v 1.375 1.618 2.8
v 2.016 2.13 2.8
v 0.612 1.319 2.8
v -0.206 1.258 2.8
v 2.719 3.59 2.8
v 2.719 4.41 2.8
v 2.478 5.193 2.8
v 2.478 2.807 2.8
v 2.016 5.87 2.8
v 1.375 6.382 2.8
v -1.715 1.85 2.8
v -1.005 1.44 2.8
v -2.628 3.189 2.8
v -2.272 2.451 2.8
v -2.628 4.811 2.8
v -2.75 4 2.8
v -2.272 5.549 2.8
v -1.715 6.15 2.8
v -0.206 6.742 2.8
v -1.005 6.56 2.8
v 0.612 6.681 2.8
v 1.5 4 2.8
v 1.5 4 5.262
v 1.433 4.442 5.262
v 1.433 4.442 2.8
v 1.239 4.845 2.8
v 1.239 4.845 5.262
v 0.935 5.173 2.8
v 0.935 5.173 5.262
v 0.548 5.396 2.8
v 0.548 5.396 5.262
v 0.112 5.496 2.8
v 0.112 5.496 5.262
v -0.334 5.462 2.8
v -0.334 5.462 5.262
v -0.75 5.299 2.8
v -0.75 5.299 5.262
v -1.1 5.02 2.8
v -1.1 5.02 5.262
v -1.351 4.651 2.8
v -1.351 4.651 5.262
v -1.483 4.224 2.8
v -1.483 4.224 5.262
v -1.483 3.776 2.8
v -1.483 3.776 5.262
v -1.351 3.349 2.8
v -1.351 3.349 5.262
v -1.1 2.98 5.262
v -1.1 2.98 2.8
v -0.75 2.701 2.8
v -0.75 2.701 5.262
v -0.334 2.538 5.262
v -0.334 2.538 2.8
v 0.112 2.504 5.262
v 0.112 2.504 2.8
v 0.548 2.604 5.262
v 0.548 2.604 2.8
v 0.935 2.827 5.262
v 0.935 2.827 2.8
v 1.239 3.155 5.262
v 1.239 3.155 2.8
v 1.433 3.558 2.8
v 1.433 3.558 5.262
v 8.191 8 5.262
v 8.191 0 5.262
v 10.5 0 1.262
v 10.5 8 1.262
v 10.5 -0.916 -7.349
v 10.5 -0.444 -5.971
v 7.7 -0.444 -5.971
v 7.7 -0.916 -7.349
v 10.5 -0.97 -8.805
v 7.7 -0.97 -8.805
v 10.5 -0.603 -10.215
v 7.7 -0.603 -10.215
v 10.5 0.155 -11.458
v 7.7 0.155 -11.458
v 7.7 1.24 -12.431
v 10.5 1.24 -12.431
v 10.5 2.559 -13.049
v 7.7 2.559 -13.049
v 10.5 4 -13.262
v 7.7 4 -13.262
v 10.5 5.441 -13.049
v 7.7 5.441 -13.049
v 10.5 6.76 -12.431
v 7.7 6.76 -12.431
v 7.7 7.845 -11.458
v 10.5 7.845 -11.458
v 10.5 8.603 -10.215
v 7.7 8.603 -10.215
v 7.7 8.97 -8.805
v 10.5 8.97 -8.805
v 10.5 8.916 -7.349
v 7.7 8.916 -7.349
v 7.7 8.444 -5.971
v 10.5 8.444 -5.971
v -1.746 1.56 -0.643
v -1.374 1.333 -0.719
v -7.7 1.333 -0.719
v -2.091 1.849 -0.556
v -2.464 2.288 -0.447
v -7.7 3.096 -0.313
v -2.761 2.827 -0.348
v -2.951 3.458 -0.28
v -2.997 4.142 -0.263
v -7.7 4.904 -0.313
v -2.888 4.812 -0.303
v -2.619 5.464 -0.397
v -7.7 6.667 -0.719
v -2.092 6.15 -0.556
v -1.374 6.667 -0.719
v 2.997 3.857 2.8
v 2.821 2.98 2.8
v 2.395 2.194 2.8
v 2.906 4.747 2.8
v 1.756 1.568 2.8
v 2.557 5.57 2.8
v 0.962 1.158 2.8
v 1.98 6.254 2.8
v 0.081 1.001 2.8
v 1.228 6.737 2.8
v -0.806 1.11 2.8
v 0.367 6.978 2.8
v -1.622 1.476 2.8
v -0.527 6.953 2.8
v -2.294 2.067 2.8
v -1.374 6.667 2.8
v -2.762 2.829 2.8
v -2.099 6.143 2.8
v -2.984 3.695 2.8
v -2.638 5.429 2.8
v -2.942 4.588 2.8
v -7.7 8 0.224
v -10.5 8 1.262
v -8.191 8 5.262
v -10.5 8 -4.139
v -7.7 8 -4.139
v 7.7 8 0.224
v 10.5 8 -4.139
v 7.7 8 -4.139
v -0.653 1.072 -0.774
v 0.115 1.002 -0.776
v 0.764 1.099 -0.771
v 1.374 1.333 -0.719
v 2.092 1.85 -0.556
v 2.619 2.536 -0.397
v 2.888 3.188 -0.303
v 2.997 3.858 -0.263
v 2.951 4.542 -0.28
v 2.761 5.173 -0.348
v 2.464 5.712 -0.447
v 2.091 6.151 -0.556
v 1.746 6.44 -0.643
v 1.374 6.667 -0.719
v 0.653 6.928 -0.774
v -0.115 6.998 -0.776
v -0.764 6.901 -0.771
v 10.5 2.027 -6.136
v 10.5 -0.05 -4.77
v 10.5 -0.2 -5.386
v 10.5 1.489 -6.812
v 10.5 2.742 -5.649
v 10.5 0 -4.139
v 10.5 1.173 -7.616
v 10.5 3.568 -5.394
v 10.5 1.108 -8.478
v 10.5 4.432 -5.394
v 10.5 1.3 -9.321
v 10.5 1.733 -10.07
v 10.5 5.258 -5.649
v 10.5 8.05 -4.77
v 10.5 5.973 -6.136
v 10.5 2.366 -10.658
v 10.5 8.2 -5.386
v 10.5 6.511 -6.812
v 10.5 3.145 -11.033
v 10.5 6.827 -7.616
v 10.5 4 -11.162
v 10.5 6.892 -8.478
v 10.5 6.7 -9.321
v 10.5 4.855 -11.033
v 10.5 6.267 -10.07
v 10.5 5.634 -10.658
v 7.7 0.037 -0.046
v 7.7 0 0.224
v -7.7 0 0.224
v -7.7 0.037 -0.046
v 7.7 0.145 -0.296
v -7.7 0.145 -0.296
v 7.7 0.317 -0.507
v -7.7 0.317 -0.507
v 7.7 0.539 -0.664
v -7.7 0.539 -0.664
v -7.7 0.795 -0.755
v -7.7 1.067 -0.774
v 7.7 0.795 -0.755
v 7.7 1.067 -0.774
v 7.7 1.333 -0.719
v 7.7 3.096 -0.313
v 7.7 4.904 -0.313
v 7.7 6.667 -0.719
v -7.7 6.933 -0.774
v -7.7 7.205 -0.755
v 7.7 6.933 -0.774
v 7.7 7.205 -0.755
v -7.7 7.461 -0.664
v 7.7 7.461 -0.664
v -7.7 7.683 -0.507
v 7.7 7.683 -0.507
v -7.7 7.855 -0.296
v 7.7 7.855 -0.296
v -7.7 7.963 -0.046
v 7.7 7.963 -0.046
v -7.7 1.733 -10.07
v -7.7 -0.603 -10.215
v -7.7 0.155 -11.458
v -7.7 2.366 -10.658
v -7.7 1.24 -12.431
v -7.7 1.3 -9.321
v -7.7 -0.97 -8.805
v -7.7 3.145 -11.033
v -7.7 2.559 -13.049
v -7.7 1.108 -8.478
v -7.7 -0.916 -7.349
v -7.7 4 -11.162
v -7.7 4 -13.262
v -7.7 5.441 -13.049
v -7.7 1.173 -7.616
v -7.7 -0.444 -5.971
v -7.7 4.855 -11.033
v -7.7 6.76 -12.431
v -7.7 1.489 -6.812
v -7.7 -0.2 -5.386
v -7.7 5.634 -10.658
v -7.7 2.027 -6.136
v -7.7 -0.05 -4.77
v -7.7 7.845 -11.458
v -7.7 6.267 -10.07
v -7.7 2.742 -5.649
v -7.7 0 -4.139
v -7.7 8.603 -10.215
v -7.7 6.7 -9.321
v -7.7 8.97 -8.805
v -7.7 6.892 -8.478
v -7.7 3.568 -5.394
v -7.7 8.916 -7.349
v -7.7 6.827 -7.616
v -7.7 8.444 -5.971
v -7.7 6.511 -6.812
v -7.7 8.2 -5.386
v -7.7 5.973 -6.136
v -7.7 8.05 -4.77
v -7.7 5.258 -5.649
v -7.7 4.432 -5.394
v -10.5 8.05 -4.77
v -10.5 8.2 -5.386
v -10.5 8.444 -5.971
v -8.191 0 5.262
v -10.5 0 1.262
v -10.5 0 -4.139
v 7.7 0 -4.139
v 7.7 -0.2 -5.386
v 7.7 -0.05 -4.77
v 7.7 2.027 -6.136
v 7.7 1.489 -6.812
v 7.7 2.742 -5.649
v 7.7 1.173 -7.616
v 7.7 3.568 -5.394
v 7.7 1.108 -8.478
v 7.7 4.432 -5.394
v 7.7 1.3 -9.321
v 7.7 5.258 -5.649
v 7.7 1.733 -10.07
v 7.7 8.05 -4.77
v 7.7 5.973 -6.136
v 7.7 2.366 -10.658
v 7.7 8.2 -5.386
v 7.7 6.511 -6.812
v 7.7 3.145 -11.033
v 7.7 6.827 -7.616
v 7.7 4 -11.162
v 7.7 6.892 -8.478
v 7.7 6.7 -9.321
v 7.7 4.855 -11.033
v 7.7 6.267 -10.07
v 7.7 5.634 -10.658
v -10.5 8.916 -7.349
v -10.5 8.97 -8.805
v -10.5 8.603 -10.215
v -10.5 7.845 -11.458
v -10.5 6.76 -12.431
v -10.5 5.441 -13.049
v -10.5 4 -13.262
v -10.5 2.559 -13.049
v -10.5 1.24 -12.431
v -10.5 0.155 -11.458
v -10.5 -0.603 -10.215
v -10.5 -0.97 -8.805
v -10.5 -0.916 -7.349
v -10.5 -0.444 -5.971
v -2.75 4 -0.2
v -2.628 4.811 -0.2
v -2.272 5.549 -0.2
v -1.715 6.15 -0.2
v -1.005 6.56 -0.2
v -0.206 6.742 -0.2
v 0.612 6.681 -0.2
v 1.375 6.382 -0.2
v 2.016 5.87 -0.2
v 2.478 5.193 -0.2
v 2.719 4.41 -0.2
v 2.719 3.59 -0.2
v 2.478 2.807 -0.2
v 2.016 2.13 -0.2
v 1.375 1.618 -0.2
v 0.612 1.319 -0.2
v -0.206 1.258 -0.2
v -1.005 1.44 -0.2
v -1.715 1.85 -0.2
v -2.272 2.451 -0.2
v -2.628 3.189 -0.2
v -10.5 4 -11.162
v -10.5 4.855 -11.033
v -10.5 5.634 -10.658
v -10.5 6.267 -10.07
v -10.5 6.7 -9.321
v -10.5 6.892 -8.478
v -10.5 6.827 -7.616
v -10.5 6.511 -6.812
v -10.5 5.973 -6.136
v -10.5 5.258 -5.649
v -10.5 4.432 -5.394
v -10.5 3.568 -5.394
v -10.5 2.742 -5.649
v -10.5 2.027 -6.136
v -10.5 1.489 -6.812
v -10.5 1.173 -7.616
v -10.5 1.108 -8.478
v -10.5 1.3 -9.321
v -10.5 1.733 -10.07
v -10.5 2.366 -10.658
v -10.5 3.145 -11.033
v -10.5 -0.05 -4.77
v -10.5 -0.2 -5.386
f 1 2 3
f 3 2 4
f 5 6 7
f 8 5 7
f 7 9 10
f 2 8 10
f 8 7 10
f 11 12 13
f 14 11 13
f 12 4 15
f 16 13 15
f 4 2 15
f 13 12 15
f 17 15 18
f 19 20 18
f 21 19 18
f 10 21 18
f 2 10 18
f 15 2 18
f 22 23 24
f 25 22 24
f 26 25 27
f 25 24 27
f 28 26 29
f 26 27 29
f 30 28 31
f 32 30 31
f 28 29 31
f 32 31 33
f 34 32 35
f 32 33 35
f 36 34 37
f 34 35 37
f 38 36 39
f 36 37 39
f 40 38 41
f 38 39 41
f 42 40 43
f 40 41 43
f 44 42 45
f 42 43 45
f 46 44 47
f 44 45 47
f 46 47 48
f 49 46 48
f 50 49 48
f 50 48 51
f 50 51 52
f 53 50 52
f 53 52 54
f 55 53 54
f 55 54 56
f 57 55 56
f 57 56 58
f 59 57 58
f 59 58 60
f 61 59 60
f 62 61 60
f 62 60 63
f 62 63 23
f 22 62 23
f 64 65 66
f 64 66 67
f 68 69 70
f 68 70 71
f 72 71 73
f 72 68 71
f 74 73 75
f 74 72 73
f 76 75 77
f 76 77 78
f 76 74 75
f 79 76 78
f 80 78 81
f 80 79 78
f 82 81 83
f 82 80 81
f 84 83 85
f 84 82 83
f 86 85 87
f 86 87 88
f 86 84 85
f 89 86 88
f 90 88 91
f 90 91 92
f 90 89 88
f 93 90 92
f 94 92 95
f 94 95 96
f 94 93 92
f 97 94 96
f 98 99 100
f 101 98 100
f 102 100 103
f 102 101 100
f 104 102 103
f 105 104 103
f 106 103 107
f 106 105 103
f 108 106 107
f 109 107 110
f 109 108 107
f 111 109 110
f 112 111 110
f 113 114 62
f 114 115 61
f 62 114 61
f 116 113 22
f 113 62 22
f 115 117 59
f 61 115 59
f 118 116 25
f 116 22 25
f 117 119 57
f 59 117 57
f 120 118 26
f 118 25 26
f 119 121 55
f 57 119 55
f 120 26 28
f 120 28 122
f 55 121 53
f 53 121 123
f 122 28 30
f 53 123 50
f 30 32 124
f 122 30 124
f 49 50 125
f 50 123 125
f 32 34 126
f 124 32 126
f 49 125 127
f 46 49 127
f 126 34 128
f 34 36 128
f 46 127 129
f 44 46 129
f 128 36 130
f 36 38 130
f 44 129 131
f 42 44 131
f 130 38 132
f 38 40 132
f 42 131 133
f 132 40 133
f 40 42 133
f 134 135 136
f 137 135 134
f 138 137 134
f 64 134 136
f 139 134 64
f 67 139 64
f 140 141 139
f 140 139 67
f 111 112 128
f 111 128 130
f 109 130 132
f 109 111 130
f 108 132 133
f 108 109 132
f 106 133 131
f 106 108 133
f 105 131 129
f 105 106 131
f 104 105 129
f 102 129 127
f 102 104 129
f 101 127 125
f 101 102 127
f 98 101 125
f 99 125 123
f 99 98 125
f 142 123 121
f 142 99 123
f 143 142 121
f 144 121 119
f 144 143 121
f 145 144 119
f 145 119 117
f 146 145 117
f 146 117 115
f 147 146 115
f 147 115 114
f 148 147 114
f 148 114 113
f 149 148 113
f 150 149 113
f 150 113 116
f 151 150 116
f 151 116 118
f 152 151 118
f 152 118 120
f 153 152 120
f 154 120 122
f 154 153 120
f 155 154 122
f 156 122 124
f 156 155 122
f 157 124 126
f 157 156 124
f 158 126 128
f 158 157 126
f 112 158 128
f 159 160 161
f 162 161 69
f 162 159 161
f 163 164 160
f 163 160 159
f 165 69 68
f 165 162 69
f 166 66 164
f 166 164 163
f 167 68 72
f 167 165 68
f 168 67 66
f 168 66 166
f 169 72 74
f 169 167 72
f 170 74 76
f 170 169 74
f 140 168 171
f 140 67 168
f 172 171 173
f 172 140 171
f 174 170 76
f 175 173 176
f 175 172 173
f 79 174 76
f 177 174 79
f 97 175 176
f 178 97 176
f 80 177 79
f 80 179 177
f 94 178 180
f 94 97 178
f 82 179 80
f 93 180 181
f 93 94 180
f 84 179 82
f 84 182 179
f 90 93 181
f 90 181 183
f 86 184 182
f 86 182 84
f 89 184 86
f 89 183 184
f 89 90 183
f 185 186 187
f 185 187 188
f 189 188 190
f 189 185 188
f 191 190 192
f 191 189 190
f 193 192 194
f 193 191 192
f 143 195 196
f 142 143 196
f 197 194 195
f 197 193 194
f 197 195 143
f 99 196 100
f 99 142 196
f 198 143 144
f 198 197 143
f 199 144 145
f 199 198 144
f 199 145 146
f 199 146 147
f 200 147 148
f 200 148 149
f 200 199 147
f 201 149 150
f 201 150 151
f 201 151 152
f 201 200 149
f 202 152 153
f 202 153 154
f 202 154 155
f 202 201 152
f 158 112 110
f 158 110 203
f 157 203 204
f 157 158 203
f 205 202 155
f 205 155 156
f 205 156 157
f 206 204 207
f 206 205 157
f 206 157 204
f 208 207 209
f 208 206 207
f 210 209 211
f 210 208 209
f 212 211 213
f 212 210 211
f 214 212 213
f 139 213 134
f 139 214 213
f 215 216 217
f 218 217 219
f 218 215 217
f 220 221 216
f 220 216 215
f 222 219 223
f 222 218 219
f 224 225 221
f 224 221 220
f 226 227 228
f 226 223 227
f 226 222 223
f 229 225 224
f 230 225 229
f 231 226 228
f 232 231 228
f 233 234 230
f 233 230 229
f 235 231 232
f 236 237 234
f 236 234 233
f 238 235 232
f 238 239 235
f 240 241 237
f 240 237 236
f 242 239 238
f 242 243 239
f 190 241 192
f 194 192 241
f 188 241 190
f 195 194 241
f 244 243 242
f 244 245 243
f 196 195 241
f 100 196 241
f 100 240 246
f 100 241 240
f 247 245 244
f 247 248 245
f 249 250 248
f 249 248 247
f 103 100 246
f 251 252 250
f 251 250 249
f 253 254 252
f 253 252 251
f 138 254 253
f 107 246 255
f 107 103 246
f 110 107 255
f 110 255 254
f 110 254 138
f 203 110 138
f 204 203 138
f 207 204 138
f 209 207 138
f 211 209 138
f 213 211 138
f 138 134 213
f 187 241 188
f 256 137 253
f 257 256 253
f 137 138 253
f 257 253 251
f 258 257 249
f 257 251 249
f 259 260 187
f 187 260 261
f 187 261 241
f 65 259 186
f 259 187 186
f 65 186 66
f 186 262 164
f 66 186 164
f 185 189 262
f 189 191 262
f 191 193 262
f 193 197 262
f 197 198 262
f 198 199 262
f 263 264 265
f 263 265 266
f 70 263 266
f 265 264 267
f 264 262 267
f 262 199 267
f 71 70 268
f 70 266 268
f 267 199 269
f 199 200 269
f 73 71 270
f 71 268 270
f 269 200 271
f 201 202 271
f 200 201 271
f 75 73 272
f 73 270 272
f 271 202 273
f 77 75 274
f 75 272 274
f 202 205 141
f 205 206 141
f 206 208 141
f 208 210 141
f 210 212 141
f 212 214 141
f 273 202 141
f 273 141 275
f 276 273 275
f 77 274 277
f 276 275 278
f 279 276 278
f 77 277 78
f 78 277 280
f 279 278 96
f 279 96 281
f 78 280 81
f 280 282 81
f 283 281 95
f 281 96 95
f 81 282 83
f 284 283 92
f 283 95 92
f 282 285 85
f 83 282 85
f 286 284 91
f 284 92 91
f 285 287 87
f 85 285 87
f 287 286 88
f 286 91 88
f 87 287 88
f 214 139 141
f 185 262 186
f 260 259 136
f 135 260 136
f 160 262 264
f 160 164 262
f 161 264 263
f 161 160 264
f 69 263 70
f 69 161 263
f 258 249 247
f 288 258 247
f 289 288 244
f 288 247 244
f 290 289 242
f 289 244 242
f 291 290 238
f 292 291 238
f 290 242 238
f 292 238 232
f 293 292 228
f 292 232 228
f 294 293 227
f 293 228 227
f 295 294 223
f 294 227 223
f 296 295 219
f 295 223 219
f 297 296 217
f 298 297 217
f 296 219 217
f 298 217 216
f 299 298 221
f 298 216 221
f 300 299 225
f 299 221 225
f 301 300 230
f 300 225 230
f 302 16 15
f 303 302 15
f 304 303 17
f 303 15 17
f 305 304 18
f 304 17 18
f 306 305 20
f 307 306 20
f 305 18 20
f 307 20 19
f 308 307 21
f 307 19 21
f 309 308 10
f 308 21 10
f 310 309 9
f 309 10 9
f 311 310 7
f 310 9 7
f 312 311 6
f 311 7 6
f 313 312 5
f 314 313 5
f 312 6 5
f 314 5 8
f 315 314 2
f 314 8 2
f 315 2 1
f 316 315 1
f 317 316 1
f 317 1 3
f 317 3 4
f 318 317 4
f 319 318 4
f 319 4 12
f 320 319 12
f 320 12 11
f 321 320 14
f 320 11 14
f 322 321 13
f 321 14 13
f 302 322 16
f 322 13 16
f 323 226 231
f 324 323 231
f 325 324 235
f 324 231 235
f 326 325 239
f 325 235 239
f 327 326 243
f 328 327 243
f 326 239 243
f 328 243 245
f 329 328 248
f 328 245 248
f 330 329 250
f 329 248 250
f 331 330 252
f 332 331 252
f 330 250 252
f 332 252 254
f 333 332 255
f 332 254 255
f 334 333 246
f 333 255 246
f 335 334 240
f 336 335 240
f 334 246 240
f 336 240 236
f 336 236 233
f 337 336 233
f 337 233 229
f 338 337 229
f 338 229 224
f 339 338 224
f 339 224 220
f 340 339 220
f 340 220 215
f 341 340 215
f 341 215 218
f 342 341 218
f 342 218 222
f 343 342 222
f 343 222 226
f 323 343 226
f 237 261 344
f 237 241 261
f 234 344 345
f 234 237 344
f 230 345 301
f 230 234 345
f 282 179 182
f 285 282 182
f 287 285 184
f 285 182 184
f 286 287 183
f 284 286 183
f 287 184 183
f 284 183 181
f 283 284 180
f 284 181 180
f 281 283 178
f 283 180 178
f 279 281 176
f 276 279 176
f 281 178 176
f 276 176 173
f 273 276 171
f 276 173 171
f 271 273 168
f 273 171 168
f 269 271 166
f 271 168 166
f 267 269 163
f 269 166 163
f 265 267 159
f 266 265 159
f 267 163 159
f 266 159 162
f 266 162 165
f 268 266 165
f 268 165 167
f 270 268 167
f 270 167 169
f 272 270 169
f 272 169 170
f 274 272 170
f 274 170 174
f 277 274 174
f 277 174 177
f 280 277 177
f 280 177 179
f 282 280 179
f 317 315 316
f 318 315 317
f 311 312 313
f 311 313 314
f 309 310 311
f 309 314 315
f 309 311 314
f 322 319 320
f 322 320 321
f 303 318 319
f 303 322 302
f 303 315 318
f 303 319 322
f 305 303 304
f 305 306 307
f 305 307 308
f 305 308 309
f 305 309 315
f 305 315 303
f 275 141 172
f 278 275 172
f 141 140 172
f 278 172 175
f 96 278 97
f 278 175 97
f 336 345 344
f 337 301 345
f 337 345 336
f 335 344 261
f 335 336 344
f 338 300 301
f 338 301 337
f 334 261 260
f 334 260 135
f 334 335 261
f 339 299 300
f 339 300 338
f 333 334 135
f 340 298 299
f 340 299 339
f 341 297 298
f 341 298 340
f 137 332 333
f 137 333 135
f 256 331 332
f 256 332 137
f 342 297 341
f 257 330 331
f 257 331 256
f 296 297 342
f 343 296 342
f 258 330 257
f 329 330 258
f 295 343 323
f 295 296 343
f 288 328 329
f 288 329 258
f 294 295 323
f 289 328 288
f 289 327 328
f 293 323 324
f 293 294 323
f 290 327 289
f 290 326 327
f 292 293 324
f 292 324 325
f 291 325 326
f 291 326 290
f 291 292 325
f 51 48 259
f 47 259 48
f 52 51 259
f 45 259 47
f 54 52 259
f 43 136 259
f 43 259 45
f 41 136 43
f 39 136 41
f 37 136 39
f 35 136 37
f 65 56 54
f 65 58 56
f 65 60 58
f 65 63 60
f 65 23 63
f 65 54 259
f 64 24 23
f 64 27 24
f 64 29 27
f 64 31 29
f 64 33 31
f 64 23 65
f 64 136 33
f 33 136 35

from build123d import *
from OCP.BRepFilletAPI import BRepFilletAPI_MakeChamfer

# Parameters (mm, degrees)
SKETCH1_W               = 21
SKETCH1_H               = 4.523364486
BOSS_EXTRUDE1_DEPTH     = 8
SKETCH2_W               = 2.8
SKETCH2_H               = 8
BOSS_EXTRUDE2_DEPTH     = 10
SKETCH3_R               = 2.9
CUT_EXTRUDE1_DEPTH      = 34
FILLET1_R               = 4
SKETCH4_R               = 8
CUT_EXTRUDE2_DEPTH      = 15.4
FILLET2_R               = 1
SKETCH6_W               = 21
SKETCH6_H               = 8
BOSS_EXTRUDE3_DEPTH     = 3
SKETCH7_R               = 1.5
CUT_EXTRUDE3_DEPTH      = 12
CUT_EXTRUDE4_DEPTH      = 2.8
CUT_EXTRUDE4_DEPTH_BACK = 12
SKETCH8_R               = 3
SKETCH9_R               = 2.75
BOSS_EXTRUDE4_DEPTH     = 3
CHAMFER1_SIZE           = 4
CHAMFER1_SIZE2          = 2.309401077
SKETCH10_R              = 5
SKETCH10_R_2            = 2.9
BOSS_EXTRUDE5_DEPTH     = 2.8
BOSS_EXTRUDE6_START     = -2.8
SKETCH11_R              = 5
SKETCH11_R_2            = 2.9
BOSS_EXTRUDE6_DEPTH     = 2.8
FILLET3_R               = 4


with BuildPart() as part:
    # Sketch1 → Boss-Extrude1 (new body)
    with BuildSketch(Plane(origin=(0, 0, 0), x_dir=(1, 0, 0), z_dir=(0, 1, 0))):
        Rectangle(SKETCH1_W, SKETCH1_H)
    extrude(amount=BOSS_EXTRUDE1_DEPTH)

    # Sketch2 → Boss-Extrude2 (add)
    with BuildSketch(Plane(origin=(0, 0, -2.261682243), x_dir=(-1, 0, 0), z_dir=(0, 0, -1))):
        with Locations((9.1, 4)):
            Rectangle(SKETCH2_W, SKETCH2_H)
        with Locations((-9.1, 4)):
            Rectangle(SKETCH2_W, SKETCH2_H)
    extrude(amount=BOSS_EXTRUDE2_DEPTH)

    # Sketch3 → Cut-Extrude1 (cut)
    with BuildSketch(Plane(origin=(10.5, 0, 0), x_dir=(0, 0, -1), z_dir=(1, 0, 0))):
        with Locations((8.261682243, 4)):
            Circle(SKETCH3_R)
    extrude(amount=-CUT_EXTRUDE1_DEPTH, mode=Mode.SUBTRACT)

    # Fillet1
    fillet1_edges = [part.edges().sort_by_distance(p)[0] for p in [
        (9.1, 0, -12.261682243),
        (-9.1, 0, -12.261682243),
        (-9.1, 8, -12.261682243),
        (9.1, 8, -12.261682243),
    ]]
    fillet(fillet1_edges, radius=FILLET1_R - 0.0001)  # a hair under: the kernel refuses the full size

    # Sketch4 → Cut-Extrude2 (cut)
    with BuildSketch(Plane.ZY.offset(-7.7)):
        with Locations((-8.261682243, 4)):
            Circle(SKETCH4_R)
    extrude(amount=CUT_EXTRUDE2_DEPTH, mode=Mode.SUBTRACT)

    # Fillet2
    fillet2_edges = [part.edges().sort_by_distance(p)[0] for p in [
        (0, 0, -1.333479013),
        (0, 8, -1.333479013),
    ]]
    fillet(fillet2_edges, radius=FILLET2_R)

    # Sketch6 → Boss-Extrude3 (add)
    with BuildSketch(Plane.XY.offset(2.261682243)):
        with Locations((0, 4)):
            Rectangle(SKETCH6_W, SKETCH6_H)
    extrude(amount=BOSS_EXTRUDE3_DEPTH)

    # Sketch7 → Cut-Extrude3 (cut)
    with BuildSketch(Plane.XY.offset(5.261682243)):
        with Locations((0, 4)):
            Circle(SKETCH7_R)
    extrude(amount=-CUT_EXTRUDE3_DEPTH, mode=Mode.SUBTRACT)

    # Sketch8 → Cut-Extrude4 (cut, two sides: drawn at the far end of the back side and taken through both)
    with BuildSketch(Plane.XY.offset(-CUT_EXTRUDE4_DEPTH_BACK)):
        with Locations(Location((0, 4, 0), (0, 0, 117.266044451))):
            Circle(SKETCH8_R)
    extrude(amount=CUT_EXTRUDE4_DEPTH + CUT_EXTRUDE4_DEPTH_BACK, mode=Mode.SUBTRACT)

    # Chamfer1: one chamfer whose edges measure the first distance from different faces: ONE call of the kernel's chamfer builder (chamfer() names one face for all edges)
    chamfer1_edges_1 = [part.edges().sort_by_distance(p)[0] for p in [
        (-10.5, 4, 5.261682243),
    ]]
    chamfer1_side_1 = [part.faces().sort_by_distance(p)[0] for p in [
        (-10.5, 4, -1.817687079),
    ]]
    chamfer1_edges_2 = [part.edges().sort_by_distance(p)[0] for p in [
        (10.5, 4, 5.261682243),
    ]]
    chamfer1_side_2 = [part.faces().sort_by_distance(p)[0] for p in [
        (10.5, 4, -1.817687079),
    ]]
    chamfer1 = BRepFilletAPI_MakeChamfer(part.part.solid().wrapped)
    for e in chamfer1_edges_1:
        chamfer1.Add(CHAMFER1_SIZE, CHAMFER1_SIZE2, e.wrapped, chamfer1_side_1[0].wrapped)  # the first distance lies on this face
    for e in chamfer1_edges_2:
        chamfer1.Add(CHAMFER1_SIZE, CHAMFER1_SIZE2, e.wrapped, chamfer1_side_2[0].wrapped)  # the first distance lies on this face
    add(Compound.cast(chamfer1.Shape()), mode=Mode.REPLACE)

    # Sketch10 → Boss-Extrude5 (add)
    with BuildSketch(Plane(origin=(10.5, 0, 0), x_dir=(0, 0, -1), z_dir=(1, 0, 0))):
        with Locations((8.261682243, 4)):
            Circle(SKETCH10_R)
        with Locations((8.261682243, 4)):
            Circle(SKETCH10_R_2, mode=Mode.SUBTRACT)
    extrude(amount=-BOSS_EXTRUDE5_DEPTH)

    # Sketch11 → Boss-Extrude6 (add)
    with BuildSketch(Plane.ZY.offset(10.5).offset(BOSS_EXTRUDE6_START)):
        with Locations((-8.261682243, 4)):
            Circle(SKETCH11_R)
        with Locations(Location((-8.261682243, 4, 0), (0, 0, 180))):
            Circle(SKETCH11_R_2, mode=Mode.SUBTRACT)
    extrude(amount=BOSS_EXTRUDE6_DEPTH)

    # Fillet3
    fillet3_edges = [part.edges().sort_by_distance(p)[0] for p in [
        (9.1, 0, -5.261682243),
        (9.1, 8, -5.261682243),
        (-9.1, 0, -5.261682243),
        (-9.1, 8, -5.261682243),
    ]]
    fillet(fillet3_edges, radius=FILLET3_R)


with BuildPart() as body_2:
    # Sketch9 → Boss-Extrude4 (new body)
    with BuildSketch(Plane(origin=(0, 0, 2.8), x_dir=(-1, 0, 0), z_dir=(0, 0, -1))):
        with Locations((0, 4)):
            Circle(SKETCH9_R)
    extrude(amount=BOSS_EXTRUDE4_DEPTH)


solid = Compound([part.part, body_2.part])
